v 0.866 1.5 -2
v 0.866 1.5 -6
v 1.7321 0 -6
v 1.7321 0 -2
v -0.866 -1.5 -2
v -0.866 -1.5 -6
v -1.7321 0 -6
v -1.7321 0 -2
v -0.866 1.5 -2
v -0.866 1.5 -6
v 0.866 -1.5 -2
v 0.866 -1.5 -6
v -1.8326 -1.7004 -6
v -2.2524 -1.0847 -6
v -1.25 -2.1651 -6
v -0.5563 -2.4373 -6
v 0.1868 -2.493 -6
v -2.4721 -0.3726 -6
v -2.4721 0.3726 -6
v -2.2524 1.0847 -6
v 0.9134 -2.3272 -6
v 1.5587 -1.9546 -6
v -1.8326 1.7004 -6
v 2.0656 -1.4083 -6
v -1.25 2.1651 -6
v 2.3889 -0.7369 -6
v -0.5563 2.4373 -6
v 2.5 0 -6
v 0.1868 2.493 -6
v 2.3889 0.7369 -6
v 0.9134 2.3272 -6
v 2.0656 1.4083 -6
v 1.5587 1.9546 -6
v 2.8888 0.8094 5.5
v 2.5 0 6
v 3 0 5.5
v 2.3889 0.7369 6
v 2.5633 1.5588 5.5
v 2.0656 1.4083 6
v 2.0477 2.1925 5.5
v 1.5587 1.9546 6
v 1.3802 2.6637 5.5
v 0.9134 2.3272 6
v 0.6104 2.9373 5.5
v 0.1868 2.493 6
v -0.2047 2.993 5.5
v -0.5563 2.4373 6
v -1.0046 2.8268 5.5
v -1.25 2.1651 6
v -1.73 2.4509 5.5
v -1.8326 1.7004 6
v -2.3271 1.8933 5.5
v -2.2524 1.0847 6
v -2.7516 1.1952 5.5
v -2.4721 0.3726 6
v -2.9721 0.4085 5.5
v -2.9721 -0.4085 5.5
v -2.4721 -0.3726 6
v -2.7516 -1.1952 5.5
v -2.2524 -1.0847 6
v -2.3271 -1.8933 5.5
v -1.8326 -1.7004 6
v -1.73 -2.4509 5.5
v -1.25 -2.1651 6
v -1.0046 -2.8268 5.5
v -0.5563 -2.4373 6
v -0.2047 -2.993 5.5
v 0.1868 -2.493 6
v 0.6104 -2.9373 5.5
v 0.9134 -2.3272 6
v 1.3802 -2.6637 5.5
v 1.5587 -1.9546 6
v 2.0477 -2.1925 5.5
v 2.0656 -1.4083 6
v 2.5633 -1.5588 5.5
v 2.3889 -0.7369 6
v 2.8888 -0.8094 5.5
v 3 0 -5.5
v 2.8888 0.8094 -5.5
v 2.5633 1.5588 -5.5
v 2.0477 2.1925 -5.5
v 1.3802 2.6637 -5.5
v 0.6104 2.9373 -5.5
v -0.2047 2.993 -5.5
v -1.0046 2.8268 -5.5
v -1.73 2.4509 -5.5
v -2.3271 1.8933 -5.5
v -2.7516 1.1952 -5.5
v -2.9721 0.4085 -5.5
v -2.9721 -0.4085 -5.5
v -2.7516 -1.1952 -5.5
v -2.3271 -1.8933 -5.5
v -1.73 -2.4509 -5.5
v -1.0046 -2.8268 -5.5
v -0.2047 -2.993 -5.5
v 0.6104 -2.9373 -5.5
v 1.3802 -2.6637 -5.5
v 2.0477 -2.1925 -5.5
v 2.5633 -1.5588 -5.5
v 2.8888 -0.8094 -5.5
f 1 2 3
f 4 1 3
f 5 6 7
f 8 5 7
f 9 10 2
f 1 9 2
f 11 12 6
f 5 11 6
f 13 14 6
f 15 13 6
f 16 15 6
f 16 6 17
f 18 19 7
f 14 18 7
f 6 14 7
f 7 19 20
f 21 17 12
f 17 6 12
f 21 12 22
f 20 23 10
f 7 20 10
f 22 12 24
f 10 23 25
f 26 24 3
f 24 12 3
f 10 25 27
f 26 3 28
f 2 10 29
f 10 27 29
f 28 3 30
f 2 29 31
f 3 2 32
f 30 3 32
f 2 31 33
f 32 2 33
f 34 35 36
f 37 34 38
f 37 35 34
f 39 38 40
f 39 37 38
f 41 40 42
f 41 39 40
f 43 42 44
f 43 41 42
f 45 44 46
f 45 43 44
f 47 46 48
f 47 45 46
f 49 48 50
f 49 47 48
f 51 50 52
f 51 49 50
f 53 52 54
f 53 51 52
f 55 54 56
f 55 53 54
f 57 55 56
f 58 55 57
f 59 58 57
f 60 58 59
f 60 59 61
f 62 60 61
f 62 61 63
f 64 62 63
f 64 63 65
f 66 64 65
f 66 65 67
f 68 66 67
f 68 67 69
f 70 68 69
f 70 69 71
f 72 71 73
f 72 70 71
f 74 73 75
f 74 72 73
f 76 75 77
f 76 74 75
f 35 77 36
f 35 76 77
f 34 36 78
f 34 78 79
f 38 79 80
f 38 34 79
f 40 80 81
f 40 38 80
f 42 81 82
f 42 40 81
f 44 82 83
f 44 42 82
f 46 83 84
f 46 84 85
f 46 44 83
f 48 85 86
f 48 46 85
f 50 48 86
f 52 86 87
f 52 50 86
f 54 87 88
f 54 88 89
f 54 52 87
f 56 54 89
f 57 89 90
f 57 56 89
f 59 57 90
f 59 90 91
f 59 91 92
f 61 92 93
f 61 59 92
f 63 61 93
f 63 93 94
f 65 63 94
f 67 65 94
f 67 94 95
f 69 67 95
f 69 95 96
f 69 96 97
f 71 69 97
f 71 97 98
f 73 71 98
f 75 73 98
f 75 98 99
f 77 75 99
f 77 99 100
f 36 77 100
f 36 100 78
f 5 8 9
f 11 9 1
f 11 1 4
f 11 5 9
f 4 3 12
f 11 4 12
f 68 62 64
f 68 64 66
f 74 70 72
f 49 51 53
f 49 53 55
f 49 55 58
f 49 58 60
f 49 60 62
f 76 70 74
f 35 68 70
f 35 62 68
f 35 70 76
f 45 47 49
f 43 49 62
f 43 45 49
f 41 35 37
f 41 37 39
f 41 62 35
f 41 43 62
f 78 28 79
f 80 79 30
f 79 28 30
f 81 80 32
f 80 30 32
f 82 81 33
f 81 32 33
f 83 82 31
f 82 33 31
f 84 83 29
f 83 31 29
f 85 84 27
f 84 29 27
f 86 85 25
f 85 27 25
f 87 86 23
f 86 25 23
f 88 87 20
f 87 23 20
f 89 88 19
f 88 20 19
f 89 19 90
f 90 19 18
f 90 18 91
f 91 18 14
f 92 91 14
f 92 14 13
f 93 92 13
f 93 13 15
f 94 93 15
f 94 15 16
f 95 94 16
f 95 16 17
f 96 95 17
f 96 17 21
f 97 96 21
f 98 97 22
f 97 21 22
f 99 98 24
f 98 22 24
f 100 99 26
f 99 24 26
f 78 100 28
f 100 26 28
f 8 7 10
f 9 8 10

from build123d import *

# Parameters (mm, degrees)
F0_R     = 3
F1_DEPTH = 6
F2_SIZE  = 0.5
F4_DEPTH = 4


with BuildPart() as f1:
    # F0 (on Top) → F1 (new body, symmetric)
    with BuildSketch(Plane.XY):
        Circle(F0_R)
    extrude(amount=F1_DEPTH, both=True)

    # F2
    f2_edges = [f1.edges().sort_by_distance(p)[0] for p in [
        (-3, 0, 6),
        (-3, 0, -6),
    ]]
    chamfer(f2_edges, length=F2_SIZE)

    # F3 (on face) → F4 (cut)
    with BuildSketch(Plane(origin=(0, 0, -6), x_dir=(1, 0, 0), z_dir=(0, 0, -1))):
        Polygon((0.866025, 1.5), (-0.866025, 1.5), (-1.732051, 0), (-0.866025, -1.5), (0.866025, -1.5), (1.732051, 0), align=None)
    extrude(amount=-F4_DEPTH, mode=Mode.SUBTRACT)


solid = f1.part
